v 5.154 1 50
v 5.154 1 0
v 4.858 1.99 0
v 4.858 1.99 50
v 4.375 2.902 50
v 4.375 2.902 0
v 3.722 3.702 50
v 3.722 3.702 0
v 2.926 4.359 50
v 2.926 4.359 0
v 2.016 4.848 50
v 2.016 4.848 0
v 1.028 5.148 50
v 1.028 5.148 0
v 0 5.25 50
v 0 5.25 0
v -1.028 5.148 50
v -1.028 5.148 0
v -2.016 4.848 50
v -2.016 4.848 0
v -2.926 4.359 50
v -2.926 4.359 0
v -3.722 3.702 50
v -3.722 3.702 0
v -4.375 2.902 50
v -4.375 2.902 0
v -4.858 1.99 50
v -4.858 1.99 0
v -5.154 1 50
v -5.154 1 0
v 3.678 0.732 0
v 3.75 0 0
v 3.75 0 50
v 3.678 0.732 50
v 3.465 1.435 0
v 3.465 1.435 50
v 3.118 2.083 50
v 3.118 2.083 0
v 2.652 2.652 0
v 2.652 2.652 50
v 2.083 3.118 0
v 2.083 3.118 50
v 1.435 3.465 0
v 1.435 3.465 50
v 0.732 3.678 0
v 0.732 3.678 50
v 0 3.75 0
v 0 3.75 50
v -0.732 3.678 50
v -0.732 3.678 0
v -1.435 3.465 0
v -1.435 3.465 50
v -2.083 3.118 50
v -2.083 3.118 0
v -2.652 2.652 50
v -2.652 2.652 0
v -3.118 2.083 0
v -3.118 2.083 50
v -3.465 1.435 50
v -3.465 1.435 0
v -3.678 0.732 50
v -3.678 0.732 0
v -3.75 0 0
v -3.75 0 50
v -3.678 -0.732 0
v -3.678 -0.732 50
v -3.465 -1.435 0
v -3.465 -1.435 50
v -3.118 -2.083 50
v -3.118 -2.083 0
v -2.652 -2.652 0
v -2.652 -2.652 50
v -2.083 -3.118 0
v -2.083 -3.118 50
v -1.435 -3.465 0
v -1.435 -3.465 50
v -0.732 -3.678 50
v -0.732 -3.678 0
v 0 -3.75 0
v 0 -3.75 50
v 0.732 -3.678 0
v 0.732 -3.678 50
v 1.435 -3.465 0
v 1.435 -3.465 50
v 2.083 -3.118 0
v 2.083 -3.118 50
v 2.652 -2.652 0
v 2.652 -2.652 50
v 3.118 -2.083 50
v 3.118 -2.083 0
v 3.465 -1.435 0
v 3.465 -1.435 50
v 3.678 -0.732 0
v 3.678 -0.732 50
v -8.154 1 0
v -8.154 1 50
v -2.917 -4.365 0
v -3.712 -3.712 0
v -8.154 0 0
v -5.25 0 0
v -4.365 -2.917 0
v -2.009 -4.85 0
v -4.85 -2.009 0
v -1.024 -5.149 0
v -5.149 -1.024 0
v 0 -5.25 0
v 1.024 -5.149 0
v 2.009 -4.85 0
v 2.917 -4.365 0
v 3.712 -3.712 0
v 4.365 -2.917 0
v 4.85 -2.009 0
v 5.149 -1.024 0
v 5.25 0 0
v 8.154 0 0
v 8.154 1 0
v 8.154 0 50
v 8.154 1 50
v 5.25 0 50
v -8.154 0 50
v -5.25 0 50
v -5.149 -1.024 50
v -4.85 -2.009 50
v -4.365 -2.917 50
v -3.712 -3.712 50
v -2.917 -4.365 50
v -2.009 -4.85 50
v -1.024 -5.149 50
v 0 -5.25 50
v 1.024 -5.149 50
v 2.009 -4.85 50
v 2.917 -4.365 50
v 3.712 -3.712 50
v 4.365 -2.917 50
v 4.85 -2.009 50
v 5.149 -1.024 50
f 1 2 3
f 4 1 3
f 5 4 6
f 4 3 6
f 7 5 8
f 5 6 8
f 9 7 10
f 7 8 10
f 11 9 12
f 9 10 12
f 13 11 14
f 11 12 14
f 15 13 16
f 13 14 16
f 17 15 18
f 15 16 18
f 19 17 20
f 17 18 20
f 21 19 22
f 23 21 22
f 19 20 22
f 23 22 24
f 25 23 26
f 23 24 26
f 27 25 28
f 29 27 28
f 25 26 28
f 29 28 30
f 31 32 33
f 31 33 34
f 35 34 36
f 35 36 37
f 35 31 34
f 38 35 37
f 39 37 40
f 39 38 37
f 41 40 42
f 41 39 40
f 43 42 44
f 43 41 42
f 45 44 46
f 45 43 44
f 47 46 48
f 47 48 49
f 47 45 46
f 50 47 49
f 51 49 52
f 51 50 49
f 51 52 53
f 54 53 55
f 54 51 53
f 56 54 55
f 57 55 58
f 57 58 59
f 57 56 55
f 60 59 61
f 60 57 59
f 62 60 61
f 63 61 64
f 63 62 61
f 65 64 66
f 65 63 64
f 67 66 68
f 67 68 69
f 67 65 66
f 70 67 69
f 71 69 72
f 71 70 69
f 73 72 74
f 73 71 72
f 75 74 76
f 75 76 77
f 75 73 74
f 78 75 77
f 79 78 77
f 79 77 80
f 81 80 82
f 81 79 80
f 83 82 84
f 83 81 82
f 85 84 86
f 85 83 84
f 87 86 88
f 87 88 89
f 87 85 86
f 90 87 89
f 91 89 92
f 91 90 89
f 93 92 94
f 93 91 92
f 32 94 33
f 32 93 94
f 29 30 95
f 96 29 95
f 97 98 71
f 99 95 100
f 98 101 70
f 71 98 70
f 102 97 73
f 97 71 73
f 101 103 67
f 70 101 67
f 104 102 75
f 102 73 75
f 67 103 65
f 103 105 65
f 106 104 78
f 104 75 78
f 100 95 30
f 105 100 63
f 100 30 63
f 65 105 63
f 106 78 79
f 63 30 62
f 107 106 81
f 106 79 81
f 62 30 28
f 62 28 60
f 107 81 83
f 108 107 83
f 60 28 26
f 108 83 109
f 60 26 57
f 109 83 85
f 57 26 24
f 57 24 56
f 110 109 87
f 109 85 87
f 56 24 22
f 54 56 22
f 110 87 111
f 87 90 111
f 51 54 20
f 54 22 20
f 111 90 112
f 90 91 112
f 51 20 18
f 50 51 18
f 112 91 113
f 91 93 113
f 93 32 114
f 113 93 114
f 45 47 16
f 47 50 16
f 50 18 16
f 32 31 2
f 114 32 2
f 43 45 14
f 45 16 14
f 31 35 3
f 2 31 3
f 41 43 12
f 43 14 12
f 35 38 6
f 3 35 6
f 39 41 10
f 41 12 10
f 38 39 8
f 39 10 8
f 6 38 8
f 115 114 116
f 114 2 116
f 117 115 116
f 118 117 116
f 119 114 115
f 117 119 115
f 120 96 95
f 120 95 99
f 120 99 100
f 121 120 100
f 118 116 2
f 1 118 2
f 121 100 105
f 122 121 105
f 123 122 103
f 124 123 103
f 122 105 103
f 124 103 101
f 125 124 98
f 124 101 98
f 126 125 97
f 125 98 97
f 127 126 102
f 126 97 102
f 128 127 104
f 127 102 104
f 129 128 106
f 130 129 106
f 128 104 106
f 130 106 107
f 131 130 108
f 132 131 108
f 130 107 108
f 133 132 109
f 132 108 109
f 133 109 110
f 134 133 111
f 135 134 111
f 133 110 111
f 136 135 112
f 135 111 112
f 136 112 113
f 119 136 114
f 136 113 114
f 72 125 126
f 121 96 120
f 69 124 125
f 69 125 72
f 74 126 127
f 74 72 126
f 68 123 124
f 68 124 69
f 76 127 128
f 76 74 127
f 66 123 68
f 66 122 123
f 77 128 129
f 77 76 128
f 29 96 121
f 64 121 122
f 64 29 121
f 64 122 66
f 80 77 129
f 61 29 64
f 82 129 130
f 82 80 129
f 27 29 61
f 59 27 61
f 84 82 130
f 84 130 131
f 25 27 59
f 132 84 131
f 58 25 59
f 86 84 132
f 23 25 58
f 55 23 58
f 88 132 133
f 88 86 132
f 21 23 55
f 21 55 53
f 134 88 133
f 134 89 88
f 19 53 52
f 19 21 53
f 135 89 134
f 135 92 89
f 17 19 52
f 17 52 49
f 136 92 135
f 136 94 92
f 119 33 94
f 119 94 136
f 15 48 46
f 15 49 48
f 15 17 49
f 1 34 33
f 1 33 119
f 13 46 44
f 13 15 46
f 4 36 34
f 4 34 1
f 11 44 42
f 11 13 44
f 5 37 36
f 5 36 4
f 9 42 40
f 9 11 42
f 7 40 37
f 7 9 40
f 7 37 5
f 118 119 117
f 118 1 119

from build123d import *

# Parameters (mm, degrees)
SKETCH2_R           = 3.75
BOSS_EXTRUDE1_DEPTH = 50


with BuildPart() as part:
    # Sketch2 → Boss-Extrude1 (new body)
    with BuildSketch(Plane.XY):
        with BuildLine():
            Line((-8.153882032, 0), (-5.25, 0))
            ThreePointArc((-5.25, 0), (0, -5.25), (5.25, 0))
            Line((5.25, 0), (8.153882032, 0))
            Line((8.153882032, 0), (8.153882032, 1))
            Line((8.153882032, 1), (5.153882032, 1))
            ThreePointArc((5.153882032, 1), (0, 5.25), (-5.153882032, 1))
            Line((-5.153882032, 1), (-8.153882032, 1))
            Line((-8.153882032, 1), (-8.153882032, 0))
        make_face()
        Circle(SKETCH2_R, mode=Mode.SUBTRACT)
    extrude(amount=BOSS_EXTRUDE1_DEPTH)


solid = part.part
